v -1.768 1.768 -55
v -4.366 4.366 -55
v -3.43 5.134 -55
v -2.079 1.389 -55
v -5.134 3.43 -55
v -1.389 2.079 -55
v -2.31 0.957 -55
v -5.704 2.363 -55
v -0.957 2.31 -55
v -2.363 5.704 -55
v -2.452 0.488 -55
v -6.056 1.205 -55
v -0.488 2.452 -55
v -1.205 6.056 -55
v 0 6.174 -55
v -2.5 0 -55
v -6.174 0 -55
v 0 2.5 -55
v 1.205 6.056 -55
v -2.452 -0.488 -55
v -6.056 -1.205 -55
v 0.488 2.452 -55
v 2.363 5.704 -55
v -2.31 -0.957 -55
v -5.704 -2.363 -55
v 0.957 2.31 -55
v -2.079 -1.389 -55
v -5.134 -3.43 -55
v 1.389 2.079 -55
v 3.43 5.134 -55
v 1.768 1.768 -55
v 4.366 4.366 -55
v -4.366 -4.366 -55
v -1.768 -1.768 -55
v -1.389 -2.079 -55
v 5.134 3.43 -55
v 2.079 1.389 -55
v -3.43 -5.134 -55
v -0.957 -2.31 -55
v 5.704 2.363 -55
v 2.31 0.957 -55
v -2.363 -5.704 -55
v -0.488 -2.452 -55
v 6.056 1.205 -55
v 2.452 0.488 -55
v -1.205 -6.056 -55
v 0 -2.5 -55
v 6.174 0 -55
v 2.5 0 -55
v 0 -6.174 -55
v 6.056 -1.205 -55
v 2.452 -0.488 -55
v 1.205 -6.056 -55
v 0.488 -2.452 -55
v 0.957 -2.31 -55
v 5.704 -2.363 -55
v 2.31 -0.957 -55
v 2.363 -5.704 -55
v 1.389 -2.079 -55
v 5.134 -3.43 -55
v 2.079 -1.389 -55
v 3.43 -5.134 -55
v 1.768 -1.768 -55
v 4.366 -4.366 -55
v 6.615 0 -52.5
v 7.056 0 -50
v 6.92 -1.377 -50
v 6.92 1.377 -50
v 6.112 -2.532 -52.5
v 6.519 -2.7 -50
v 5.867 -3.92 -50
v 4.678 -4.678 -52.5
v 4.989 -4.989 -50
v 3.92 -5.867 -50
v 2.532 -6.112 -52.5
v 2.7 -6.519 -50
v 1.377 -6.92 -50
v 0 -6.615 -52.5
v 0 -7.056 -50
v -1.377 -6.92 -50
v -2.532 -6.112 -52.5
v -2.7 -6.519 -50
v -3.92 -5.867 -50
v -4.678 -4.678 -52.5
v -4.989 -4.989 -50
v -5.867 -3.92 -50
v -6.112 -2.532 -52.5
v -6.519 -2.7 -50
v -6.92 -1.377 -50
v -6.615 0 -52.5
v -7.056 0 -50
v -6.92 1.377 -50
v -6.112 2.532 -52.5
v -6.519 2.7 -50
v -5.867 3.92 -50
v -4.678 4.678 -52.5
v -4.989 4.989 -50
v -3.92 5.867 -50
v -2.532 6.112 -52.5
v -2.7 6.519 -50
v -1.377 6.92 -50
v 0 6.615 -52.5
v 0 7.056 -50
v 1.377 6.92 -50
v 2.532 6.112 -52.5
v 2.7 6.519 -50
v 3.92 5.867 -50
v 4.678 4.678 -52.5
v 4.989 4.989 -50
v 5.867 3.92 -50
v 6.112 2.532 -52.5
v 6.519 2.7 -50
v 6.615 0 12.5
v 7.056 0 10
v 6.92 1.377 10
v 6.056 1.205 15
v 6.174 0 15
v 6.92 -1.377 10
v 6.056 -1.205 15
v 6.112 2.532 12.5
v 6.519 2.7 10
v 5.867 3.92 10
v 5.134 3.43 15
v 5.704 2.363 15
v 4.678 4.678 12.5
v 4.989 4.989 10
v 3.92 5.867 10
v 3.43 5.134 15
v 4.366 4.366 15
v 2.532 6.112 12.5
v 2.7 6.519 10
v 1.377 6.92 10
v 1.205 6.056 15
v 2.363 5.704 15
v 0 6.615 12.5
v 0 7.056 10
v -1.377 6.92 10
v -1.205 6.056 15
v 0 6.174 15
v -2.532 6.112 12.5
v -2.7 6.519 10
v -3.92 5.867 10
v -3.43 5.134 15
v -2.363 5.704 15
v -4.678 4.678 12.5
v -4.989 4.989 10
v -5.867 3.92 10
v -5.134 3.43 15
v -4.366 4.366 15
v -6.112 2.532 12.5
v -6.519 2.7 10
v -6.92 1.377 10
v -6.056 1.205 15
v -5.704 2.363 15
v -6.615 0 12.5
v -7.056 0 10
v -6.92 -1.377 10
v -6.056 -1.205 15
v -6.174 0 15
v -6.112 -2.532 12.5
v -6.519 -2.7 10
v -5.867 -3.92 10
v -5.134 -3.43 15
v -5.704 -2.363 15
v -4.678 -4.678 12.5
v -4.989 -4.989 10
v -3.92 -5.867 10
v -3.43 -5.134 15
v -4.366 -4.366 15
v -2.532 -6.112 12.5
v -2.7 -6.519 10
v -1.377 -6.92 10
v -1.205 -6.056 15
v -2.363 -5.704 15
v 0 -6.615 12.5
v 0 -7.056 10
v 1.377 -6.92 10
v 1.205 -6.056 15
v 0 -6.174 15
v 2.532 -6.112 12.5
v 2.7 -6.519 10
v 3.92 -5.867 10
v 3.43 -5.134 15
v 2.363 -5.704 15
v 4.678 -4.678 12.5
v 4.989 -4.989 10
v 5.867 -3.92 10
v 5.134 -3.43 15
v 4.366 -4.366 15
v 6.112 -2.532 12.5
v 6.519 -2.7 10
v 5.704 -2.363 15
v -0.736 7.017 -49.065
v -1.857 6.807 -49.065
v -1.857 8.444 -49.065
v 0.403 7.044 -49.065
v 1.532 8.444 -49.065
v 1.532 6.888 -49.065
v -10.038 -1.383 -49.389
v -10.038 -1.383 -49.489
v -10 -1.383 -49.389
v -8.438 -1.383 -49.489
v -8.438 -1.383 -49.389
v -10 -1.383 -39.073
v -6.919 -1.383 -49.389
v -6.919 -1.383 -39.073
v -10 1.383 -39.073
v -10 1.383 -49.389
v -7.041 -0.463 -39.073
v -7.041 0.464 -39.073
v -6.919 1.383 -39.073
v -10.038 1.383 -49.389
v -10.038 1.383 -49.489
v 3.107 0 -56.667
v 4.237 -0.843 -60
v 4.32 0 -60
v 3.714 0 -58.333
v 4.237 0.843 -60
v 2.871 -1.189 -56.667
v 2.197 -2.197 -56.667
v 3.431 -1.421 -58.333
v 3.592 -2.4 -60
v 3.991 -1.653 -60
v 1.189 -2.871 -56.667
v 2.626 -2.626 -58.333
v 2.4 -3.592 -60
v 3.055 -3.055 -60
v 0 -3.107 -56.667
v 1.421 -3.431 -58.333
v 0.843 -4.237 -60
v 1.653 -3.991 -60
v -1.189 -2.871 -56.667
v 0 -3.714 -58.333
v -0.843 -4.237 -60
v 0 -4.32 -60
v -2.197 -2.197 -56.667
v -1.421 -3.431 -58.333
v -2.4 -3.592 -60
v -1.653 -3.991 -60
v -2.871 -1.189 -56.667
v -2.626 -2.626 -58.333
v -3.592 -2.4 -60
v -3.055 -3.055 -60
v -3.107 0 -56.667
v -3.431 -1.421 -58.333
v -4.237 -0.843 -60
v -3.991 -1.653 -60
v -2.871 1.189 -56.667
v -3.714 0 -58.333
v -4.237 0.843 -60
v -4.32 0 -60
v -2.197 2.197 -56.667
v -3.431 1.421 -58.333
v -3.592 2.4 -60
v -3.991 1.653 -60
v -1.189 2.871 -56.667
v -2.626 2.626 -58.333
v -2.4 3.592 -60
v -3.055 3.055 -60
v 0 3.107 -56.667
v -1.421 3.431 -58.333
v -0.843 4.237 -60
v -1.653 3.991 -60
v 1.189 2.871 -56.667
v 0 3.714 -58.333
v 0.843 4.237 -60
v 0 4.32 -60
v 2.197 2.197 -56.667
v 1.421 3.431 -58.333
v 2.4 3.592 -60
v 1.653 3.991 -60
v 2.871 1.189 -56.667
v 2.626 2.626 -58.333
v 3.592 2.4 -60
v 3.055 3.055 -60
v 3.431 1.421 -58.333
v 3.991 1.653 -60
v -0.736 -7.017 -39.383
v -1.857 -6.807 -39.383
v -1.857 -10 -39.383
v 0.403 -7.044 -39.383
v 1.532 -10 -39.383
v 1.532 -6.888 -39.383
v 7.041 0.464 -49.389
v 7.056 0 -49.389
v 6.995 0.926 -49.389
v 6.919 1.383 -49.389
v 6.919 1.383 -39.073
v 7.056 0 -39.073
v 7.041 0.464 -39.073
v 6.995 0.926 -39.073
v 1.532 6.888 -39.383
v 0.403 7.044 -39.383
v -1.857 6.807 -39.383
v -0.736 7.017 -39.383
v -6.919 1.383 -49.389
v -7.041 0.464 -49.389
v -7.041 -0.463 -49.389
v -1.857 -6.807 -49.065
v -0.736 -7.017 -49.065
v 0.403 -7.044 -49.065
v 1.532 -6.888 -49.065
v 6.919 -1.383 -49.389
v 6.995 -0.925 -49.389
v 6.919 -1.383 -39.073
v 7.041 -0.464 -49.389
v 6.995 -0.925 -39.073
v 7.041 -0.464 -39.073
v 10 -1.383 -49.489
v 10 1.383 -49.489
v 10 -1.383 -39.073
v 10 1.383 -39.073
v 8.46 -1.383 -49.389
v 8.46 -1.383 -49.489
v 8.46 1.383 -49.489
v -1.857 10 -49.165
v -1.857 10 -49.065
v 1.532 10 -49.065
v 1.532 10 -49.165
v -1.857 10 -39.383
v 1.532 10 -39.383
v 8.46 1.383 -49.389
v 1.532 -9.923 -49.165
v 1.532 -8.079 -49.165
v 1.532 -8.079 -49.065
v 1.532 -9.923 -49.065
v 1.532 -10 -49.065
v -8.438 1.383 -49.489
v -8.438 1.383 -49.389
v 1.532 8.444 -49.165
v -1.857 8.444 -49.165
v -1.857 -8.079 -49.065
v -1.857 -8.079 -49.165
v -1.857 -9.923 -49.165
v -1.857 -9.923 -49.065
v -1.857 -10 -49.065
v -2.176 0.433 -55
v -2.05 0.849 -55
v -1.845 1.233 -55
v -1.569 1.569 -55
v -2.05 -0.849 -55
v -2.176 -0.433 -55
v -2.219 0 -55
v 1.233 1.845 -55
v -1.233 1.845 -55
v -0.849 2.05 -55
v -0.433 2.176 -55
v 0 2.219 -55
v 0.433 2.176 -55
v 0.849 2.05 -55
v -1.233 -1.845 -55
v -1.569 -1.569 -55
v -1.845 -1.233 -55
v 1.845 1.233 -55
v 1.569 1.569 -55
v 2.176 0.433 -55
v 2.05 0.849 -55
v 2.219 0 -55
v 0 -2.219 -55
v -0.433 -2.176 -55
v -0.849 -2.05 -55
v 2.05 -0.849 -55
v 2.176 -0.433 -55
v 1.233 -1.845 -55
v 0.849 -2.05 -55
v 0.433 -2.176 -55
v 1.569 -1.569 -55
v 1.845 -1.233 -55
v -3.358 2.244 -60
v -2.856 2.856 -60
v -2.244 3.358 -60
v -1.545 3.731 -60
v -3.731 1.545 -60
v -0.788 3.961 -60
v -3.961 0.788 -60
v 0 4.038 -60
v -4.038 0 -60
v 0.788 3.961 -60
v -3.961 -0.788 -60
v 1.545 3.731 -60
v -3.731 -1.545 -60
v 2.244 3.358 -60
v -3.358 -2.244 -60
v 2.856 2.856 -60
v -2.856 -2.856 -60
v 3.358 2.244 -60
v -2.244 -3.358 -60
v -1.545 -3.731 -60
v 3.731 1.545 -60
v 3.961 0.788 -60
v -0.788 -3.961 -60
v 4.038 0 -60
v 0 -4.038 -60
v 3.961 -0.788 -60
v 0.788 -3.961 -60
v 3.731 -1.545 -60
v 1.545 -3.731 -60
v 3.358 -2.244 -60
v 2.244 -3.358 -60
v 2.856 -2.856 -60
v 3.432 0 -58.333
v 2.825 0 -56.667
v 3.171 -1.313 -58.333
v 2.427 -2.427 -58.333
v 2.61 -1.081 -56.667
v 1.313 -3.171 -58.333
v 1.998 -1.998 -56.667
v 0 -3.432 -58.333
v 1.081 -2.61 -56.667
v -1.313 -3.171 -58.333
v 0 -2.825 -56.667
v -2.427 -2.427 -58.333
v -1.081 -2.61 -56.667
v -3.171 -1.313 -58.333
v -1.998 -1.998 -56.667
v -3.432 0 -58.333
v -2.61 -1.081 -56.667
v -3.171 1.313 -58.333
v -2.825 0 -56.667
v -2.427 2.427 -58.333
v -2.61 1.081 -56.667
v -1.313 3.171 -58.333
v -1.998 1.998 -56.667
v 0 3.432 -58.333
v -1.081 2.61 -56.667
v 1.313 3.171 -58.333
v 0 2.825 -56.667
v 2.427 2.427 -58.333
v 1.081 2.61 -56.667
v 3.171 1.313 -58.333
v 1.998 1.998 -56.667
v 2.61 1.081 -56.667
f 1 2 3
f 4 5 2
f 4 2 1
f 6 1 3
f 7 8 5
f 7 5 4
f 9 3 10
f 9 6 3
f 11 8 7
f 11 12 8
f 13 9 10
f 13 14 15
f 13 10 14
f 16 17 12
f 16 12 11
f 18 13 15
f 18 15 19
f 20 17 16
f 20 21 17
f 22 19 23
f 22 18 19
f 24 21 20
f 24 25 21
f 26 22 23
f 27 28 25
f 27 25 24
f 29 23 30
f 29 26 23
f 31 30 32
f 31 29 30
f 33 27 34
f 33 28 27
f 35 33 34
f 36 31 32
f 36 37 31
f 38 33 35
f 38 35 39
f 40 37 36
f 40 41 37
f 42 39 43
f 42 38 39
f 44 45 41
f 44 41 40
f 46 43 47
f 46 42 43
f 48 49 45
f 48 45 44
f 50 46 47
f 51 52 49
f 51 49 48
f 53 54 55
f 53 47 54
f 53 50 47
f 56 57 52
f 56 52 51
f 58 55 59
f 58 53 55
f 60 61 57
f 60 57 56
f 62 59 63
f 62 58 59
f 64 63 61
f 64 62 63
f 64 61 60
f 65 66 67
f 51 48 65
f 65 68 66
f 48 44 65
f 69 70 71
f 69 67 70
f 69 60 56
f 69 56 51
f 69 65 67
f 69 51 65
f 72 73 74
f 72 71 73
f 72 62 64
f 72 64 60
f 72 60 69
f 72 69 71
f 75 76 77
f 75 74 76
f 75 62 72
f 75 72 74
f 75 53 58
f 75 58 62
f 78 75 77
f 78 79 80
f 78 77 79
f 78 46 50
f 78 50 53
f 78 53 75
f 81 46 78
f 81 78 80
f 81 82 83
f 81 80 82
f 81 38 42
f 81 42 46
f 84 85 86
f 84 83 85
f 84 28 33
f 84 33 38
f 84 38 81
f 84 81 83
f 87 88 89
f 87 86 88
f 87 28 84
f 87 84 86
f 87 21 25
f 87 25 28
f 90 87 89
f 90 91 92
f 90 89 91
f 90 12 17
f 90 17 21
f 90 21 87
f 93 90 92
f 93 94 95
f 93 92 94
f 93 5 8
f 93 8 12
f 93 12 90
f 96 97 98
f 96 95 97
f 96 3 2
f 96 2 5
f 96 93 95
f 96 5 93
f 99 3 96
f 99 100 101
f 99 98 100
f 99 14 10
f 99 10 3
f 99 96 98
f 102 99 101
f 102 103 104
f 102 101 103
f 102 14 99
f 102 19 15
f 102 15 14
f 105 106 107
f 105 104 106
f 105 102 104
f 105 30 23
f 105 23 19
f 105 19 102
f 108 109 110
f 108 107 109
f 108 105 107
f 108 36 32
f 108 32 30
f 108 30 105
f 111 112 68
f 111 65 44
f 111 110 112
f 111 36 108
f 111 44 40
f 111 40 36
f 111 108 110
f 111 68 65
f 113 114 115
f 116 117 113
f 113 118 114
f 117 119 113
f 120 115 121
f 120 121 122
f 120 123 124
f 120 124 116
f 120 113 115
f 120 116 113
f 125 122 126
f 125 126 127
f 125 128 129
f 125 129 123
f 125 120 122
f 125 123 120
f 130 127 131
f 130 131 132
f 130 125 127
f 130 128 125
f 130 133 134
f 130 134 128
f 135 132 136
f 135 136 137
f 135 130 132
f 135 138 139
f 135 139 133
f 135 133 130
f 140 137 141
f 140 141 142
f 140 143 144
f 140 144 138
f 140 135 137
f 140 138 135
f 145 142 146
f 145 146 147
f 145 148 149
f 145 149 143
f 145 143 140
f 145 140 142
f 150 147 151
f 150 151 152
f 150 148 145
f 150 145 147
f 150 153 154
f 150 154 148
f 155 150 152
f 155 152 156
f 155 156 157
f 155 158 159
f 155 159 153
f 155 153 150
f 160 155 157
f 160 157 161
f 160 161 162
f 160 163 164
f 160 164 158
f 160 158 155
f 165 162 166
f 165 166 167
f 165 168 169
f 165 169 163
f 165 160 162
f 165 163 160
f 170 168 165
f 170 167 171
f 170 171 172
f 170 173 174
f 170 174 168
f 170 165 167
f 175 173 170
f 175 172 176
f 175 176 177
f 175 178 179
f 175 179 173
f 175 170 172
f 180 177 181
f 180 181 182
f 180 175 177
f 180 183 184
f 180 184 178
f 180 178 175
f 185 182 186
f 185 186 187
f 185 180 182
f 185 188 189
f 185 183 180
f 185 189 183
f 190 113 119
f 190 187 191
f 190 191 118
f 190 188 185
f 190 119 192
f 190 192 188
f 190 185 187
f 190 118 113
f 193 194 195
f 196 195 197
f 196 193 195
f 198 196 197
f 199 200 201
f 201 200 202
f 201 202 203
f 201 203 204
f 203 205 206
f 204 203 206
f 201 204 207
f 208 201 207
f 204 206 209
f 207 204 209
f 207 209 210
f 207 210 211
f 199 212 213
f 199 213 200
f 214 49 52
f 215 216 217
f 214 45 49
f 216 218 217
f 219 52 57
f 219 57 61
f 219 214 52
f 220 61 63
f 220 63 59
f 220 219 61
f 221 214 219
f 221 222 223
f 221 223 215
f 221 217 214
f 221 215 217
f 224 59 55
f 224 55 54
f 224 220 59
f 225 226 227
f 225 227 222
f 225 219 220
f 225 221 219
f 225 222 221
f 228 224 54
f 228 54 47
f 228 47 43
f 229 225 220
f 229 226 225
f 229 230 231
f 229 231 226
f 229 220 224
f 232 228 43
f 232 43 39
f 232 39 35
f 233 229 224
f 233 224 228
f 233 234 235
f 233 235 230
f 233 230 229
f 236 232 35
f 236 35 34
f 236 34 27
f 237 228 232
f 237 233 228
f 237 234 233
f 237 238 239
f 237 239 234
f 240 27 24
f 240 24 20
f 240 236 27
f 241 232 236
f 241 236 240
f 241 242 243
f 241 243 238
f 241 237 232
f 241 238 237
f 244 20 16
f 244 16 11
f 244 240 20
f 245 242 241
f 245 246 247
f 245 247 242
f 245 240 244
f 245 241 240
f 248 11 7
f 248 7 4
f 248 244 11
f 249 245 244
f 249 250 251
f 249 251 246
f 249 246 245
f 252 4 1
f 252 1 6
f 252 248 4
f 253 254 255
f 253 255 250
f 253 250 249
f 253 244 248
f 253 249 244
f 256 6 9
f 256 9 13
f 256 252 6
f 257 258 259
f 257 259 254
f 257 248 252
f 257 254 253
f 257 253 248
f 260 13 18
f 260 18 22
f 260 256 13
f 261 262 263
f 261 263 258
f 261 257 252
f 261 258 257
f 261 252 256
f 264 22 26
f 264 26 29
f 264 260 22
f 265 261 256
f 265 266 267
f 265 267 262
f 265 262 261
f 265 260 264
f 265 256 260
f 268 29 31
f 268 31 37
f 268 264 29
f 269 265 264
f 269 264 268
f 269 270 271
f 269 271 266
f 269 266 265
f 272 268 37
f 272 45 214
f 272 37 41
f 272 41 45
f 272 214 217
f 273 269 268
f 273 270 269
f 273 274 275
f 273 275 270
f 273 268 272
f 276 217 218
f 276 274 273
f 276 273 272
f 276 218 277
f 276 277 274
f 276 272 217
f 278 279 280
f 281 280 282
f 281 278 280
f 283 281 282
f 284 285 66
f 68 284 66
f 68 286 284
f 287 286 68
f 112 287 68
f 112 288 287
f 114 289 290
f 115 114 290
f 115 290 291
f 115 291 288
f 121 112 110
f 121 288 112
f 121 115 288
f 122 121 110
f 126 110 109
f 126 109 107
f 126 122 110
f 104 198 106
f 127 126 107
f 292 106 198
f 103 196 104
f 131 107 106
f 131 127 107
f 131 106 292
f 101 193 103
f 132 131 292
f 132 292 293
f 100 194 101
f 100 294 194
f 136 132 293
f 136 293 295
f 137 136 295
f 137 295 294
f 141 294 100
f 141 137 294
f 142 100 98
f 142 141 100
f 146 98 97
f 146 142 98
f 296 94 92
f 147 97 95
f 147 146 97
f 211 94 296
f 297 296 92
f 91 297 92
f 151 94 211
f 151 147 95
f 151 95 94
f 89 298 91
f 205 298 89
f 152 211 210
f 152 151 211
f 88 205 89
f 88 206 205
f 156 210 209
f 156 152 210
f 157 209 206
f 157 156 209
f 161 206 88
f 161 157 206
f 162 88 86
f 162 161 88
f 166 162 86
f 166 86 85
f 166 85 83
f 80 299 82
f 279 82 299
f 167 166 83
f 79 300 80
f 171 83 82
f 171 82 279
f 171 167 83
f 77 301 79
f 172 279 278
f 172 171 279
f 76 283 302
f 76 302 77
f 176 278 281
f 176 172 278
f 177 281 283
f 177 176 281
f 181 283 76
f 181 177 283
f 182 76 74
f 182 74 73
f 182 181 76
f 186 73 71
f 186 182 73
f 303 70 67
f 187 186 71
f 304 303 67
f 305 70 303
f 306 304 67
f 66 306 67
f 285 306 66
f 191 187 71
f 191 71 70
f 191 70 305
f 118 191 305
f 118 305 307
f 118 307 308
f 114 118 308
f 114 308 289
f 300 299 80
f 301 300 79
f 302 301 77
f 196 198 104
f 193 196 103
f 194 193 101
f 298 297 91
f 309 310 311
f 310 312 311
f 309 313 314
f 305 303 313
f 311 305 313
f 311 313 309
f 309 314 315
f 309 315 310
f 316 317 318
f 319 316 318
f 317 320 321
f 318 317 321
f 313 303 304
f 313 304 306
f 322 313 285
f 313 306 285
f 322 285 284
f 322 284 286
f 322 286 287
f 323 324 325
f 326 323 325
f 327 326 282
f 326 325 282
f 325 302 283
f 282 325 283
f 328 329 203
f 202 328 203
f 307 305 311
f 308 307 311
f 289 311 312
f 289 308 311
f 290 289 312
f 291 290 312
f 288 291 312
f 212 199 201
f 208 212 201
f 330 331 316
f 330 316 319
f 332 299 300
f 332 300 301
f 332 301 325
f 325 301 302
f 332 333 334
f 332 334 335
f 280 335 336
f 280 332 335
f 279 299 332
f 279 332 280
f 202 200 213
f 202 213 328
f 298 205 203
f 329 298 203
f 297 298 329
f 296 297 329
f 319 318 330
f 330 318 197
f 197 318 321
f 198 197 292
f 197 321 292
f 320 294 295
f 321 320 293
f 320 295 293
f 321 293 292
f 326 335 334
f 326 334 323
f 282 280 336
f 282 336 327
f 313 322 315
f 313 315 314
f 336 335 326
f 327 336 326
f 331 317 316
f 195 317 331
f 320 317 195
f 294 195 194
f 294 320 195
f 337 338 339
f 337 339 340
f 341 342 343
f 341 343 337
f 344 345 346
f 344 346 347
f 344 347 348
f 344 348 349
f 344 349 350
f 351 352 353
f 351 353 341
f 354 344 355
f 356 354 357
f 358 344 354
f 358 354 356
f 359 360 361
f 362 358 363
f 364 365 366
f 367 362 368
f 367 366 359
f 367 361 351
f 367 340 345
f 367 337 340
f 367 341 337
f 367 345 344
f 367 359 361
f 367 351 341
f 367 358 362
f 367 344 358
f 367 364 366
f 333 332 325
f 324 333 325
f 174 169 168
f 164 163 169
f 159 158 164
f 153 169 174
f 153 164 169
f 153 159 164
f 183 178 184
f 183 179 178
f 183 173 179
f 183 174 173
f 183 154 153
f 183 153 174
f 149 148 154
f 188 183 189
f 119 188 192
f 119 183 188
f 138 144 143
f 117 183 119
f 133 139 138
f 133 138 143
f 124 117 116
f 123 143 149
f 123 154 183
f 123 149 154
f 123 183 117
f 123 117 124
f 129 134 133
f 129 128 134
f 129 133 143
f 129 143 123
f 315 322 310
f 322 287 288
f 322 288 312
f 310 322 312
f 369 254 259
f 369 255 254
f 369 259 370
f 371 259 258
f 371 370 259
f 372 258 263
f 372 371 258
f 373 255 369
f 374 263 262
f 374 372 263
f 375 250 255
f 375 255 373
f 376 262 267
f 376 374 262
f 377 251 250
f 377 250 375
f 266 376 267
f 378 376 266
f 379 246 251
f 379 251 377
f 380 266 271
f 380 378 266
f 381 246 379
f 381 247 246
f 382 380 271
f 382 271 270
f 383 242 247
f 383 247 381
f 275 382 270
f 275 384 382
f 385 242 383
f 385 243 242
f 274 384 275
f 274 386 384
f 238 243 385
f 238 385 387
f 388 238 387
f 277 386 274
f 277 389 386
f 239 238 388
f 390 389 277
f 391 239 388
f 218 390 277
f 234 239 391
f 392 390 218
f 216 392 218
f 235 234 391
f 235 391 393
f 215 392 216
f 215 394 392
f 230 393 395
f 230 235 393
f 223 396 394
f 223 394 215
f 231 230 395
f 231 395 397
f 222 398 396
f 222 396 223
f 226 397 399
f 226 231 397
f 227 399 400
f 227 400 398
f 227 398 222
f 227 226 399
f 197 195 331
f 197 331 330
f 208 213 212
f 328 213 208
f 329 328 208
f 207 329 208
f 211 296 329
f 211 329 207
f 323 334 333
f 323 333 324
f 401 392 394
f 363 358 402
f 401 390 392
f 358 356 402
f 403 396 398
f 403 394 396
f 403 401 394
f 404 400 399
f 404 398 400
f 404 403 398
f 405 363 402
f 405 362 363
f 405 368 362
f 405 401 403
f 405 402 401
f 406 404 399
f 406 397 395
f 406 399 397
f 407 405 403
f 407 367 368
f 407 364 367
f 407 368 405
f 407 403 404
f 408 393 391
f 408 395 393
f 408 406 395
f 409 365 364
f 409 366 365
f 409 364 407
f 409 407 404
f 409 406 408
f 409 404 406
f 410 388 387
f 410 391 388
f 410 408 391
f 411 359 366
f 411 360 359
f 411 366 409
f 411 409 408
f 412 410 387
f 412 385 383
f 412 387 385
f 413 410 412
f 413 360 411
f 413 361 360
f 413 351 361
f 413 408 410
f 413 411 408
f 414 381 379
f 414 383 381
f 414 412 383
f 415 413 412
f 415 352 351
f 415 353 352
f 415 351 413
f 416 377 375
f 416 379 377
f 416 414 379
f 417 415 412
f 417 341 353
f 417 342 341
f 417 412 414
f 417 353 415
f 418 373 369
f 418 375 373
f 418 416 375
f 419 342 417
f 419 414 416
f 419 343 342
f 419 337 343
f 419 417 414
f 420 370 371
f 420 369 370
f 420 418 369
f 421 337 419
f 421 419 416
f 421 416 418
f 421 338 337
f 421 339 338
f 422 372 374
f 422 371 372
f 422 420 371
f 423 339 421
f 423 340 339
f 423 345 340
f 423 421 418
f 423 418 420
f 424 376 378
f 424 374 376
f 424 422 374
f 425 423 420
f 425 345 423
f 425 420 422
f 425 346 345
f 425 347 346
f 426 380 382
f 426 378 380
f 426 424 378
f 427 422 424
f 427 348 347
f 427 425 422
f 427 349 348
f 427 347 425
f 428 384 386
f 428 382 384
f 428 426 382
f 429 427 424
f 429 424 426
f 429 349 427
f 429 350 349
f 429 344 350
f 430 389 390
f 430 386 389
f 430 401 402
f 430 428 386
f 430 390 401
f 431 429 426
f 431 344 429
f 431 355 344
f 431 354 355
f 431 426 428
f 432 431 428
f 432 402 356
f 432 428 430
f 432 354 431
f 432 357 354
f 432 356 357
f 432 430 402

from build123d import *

# Parameters (mm, degrees)
F0_R           = 7.0559879231
F1_DEPTH       = 10
F1_DEPTH_BACK  = 50
F1_FACE_R      = 7.0559879231
F2_DEPTH       = 5
F2_TAPER       = 10
F1_FACE1_R     = 7.0559879231
F3_DEPTH       = 5
F3_TAPER       = 10
F4_R           = 2.5004277464
F5_DEPTH       = 5
F5_TAPER       = -20
F6_R           = 4.0384406511
F7_DEPTH       = 5
F7_TAPER       = 20
F8_W           = 2.7660944033
F8_H           = 10.3161744773
F9_DEPTH       = 10
F9_DEPTH_BACK  = 10
F10_W          = 1.5404122384
F10_H          = 2.7660944033
F10_W_2        = 1.5997784212
F11_DEPTH      = 0.1
F12_W          = 3.388955025
F12_H          = 9.6827298403
F13_DEPTH      = 10
F13_DEPTH_BACK = 10
F14_W          = 3.388955025
F14_H          = 1.5562066355
F14_H_2        = 1.8440047279
F15_DEPTH      = 0.1


with BuildPart() as f1:
    # F0 (on Top) → F1 (new body, two sides)
    with BuildSketch(Plane.XY) as f1_sk:
        Circle(F0_R)
    extrude(amount=F1_DEPTH)
    extrude(f1_sk.sketch, amount=-F1_DEPTH_BACK)

    # F1_face (on face) → F2 (join)
    with BuildSketch(Plane.XY.offset(10)):
        Circle(F1_FACE_R)
    extrude(amount=F2_DEPTH, taper=F2_TAPER)

    # F1_face1 (on face) → F3 (join)
    with BuildSketch(Plane(origin=(0, 0, -50), x_dir=(1, 0, 0), z_dir=(0, 0, -1))):
        Circle(F1_FACE1_R)
    extrude(amount=F3_DEPTH, taper=F3_TAPER)

    # F4 (on face) → F5 (join)
    with BuildSketch(Plane(origin=(0, 0, -55), x_dir=(1, 0, 0), z_dir=(0, 0, -1))):
        Circle(F4_R)
    extrude(amount=F5_DEPTH, taper=F5_TAPER)

    # F6 (on face) → F7 (cut)
    with BuildSketch(Plane(origin=(0, 0, -60), x_dir=(1, 0, 0), z_dir=(0, 0, -1))):
        Circle(F6_R)
    extrude(amount=-F7_DEPTH, taper=F7_TAPER, mode=Mode.SUBTRACT)

    # F8 (on Right) → F9 (join, two sides)
    with BuildSketch(Plane.YZ) as f9_sk:
        with Locations((0.0003051246, -44.2310776561)):
            Rectangle(F8_W, F8_H)
    extrude(amount=F9_DEPTH)
    extrude(f9_sk.sketch, amount=-F9_DEPTH_BACK)

    # F10 (on face) → F11 (join)
    with BuildSketch(Plane(origin=(0, 0, -49.3891648948), x_dir=(1, 0, 0), z_dir=(0, 0, -1))):
        with Locations((9.2297938808, -0.0003051246)):
            Rectangle(F10_W, F10_H)
        with Locations((-9.2380219139, -0.0003051246)):
            Rectangle(F10_W_2, F10_H)
    extrude(amount=F11_DEPTH)

    # F12 (on Front) → F13 (join, two sides)
    with BuildSketch(Plane.XZ) as f13_sk:
        with Locations((-0.162121607, -44.2238897085)):
            Rectangle(F12_W, F12_H)
    extrude(amount=F13_DEPTH)
    extrude(f13_sk.sketch, amount=-F13_DEPTH_BACK)

    # F14 (on face) → F15 (join)
    with BuildSketch(Plane(origin=(0, 0, -49.0652546287), x_dir=(1, 0, 0), z_dir=(0, 0, -1))):
        with Locations((-0.162121607, -9.2218966823)):
            Rectangle(F14_W, F14_H)
        with Locations((-0.162121607, 9.0010403655)):
            Rectangle(F14_W, F14_H_2)
    extrude(amount=F15_DEPTH)


solid = f1.part
